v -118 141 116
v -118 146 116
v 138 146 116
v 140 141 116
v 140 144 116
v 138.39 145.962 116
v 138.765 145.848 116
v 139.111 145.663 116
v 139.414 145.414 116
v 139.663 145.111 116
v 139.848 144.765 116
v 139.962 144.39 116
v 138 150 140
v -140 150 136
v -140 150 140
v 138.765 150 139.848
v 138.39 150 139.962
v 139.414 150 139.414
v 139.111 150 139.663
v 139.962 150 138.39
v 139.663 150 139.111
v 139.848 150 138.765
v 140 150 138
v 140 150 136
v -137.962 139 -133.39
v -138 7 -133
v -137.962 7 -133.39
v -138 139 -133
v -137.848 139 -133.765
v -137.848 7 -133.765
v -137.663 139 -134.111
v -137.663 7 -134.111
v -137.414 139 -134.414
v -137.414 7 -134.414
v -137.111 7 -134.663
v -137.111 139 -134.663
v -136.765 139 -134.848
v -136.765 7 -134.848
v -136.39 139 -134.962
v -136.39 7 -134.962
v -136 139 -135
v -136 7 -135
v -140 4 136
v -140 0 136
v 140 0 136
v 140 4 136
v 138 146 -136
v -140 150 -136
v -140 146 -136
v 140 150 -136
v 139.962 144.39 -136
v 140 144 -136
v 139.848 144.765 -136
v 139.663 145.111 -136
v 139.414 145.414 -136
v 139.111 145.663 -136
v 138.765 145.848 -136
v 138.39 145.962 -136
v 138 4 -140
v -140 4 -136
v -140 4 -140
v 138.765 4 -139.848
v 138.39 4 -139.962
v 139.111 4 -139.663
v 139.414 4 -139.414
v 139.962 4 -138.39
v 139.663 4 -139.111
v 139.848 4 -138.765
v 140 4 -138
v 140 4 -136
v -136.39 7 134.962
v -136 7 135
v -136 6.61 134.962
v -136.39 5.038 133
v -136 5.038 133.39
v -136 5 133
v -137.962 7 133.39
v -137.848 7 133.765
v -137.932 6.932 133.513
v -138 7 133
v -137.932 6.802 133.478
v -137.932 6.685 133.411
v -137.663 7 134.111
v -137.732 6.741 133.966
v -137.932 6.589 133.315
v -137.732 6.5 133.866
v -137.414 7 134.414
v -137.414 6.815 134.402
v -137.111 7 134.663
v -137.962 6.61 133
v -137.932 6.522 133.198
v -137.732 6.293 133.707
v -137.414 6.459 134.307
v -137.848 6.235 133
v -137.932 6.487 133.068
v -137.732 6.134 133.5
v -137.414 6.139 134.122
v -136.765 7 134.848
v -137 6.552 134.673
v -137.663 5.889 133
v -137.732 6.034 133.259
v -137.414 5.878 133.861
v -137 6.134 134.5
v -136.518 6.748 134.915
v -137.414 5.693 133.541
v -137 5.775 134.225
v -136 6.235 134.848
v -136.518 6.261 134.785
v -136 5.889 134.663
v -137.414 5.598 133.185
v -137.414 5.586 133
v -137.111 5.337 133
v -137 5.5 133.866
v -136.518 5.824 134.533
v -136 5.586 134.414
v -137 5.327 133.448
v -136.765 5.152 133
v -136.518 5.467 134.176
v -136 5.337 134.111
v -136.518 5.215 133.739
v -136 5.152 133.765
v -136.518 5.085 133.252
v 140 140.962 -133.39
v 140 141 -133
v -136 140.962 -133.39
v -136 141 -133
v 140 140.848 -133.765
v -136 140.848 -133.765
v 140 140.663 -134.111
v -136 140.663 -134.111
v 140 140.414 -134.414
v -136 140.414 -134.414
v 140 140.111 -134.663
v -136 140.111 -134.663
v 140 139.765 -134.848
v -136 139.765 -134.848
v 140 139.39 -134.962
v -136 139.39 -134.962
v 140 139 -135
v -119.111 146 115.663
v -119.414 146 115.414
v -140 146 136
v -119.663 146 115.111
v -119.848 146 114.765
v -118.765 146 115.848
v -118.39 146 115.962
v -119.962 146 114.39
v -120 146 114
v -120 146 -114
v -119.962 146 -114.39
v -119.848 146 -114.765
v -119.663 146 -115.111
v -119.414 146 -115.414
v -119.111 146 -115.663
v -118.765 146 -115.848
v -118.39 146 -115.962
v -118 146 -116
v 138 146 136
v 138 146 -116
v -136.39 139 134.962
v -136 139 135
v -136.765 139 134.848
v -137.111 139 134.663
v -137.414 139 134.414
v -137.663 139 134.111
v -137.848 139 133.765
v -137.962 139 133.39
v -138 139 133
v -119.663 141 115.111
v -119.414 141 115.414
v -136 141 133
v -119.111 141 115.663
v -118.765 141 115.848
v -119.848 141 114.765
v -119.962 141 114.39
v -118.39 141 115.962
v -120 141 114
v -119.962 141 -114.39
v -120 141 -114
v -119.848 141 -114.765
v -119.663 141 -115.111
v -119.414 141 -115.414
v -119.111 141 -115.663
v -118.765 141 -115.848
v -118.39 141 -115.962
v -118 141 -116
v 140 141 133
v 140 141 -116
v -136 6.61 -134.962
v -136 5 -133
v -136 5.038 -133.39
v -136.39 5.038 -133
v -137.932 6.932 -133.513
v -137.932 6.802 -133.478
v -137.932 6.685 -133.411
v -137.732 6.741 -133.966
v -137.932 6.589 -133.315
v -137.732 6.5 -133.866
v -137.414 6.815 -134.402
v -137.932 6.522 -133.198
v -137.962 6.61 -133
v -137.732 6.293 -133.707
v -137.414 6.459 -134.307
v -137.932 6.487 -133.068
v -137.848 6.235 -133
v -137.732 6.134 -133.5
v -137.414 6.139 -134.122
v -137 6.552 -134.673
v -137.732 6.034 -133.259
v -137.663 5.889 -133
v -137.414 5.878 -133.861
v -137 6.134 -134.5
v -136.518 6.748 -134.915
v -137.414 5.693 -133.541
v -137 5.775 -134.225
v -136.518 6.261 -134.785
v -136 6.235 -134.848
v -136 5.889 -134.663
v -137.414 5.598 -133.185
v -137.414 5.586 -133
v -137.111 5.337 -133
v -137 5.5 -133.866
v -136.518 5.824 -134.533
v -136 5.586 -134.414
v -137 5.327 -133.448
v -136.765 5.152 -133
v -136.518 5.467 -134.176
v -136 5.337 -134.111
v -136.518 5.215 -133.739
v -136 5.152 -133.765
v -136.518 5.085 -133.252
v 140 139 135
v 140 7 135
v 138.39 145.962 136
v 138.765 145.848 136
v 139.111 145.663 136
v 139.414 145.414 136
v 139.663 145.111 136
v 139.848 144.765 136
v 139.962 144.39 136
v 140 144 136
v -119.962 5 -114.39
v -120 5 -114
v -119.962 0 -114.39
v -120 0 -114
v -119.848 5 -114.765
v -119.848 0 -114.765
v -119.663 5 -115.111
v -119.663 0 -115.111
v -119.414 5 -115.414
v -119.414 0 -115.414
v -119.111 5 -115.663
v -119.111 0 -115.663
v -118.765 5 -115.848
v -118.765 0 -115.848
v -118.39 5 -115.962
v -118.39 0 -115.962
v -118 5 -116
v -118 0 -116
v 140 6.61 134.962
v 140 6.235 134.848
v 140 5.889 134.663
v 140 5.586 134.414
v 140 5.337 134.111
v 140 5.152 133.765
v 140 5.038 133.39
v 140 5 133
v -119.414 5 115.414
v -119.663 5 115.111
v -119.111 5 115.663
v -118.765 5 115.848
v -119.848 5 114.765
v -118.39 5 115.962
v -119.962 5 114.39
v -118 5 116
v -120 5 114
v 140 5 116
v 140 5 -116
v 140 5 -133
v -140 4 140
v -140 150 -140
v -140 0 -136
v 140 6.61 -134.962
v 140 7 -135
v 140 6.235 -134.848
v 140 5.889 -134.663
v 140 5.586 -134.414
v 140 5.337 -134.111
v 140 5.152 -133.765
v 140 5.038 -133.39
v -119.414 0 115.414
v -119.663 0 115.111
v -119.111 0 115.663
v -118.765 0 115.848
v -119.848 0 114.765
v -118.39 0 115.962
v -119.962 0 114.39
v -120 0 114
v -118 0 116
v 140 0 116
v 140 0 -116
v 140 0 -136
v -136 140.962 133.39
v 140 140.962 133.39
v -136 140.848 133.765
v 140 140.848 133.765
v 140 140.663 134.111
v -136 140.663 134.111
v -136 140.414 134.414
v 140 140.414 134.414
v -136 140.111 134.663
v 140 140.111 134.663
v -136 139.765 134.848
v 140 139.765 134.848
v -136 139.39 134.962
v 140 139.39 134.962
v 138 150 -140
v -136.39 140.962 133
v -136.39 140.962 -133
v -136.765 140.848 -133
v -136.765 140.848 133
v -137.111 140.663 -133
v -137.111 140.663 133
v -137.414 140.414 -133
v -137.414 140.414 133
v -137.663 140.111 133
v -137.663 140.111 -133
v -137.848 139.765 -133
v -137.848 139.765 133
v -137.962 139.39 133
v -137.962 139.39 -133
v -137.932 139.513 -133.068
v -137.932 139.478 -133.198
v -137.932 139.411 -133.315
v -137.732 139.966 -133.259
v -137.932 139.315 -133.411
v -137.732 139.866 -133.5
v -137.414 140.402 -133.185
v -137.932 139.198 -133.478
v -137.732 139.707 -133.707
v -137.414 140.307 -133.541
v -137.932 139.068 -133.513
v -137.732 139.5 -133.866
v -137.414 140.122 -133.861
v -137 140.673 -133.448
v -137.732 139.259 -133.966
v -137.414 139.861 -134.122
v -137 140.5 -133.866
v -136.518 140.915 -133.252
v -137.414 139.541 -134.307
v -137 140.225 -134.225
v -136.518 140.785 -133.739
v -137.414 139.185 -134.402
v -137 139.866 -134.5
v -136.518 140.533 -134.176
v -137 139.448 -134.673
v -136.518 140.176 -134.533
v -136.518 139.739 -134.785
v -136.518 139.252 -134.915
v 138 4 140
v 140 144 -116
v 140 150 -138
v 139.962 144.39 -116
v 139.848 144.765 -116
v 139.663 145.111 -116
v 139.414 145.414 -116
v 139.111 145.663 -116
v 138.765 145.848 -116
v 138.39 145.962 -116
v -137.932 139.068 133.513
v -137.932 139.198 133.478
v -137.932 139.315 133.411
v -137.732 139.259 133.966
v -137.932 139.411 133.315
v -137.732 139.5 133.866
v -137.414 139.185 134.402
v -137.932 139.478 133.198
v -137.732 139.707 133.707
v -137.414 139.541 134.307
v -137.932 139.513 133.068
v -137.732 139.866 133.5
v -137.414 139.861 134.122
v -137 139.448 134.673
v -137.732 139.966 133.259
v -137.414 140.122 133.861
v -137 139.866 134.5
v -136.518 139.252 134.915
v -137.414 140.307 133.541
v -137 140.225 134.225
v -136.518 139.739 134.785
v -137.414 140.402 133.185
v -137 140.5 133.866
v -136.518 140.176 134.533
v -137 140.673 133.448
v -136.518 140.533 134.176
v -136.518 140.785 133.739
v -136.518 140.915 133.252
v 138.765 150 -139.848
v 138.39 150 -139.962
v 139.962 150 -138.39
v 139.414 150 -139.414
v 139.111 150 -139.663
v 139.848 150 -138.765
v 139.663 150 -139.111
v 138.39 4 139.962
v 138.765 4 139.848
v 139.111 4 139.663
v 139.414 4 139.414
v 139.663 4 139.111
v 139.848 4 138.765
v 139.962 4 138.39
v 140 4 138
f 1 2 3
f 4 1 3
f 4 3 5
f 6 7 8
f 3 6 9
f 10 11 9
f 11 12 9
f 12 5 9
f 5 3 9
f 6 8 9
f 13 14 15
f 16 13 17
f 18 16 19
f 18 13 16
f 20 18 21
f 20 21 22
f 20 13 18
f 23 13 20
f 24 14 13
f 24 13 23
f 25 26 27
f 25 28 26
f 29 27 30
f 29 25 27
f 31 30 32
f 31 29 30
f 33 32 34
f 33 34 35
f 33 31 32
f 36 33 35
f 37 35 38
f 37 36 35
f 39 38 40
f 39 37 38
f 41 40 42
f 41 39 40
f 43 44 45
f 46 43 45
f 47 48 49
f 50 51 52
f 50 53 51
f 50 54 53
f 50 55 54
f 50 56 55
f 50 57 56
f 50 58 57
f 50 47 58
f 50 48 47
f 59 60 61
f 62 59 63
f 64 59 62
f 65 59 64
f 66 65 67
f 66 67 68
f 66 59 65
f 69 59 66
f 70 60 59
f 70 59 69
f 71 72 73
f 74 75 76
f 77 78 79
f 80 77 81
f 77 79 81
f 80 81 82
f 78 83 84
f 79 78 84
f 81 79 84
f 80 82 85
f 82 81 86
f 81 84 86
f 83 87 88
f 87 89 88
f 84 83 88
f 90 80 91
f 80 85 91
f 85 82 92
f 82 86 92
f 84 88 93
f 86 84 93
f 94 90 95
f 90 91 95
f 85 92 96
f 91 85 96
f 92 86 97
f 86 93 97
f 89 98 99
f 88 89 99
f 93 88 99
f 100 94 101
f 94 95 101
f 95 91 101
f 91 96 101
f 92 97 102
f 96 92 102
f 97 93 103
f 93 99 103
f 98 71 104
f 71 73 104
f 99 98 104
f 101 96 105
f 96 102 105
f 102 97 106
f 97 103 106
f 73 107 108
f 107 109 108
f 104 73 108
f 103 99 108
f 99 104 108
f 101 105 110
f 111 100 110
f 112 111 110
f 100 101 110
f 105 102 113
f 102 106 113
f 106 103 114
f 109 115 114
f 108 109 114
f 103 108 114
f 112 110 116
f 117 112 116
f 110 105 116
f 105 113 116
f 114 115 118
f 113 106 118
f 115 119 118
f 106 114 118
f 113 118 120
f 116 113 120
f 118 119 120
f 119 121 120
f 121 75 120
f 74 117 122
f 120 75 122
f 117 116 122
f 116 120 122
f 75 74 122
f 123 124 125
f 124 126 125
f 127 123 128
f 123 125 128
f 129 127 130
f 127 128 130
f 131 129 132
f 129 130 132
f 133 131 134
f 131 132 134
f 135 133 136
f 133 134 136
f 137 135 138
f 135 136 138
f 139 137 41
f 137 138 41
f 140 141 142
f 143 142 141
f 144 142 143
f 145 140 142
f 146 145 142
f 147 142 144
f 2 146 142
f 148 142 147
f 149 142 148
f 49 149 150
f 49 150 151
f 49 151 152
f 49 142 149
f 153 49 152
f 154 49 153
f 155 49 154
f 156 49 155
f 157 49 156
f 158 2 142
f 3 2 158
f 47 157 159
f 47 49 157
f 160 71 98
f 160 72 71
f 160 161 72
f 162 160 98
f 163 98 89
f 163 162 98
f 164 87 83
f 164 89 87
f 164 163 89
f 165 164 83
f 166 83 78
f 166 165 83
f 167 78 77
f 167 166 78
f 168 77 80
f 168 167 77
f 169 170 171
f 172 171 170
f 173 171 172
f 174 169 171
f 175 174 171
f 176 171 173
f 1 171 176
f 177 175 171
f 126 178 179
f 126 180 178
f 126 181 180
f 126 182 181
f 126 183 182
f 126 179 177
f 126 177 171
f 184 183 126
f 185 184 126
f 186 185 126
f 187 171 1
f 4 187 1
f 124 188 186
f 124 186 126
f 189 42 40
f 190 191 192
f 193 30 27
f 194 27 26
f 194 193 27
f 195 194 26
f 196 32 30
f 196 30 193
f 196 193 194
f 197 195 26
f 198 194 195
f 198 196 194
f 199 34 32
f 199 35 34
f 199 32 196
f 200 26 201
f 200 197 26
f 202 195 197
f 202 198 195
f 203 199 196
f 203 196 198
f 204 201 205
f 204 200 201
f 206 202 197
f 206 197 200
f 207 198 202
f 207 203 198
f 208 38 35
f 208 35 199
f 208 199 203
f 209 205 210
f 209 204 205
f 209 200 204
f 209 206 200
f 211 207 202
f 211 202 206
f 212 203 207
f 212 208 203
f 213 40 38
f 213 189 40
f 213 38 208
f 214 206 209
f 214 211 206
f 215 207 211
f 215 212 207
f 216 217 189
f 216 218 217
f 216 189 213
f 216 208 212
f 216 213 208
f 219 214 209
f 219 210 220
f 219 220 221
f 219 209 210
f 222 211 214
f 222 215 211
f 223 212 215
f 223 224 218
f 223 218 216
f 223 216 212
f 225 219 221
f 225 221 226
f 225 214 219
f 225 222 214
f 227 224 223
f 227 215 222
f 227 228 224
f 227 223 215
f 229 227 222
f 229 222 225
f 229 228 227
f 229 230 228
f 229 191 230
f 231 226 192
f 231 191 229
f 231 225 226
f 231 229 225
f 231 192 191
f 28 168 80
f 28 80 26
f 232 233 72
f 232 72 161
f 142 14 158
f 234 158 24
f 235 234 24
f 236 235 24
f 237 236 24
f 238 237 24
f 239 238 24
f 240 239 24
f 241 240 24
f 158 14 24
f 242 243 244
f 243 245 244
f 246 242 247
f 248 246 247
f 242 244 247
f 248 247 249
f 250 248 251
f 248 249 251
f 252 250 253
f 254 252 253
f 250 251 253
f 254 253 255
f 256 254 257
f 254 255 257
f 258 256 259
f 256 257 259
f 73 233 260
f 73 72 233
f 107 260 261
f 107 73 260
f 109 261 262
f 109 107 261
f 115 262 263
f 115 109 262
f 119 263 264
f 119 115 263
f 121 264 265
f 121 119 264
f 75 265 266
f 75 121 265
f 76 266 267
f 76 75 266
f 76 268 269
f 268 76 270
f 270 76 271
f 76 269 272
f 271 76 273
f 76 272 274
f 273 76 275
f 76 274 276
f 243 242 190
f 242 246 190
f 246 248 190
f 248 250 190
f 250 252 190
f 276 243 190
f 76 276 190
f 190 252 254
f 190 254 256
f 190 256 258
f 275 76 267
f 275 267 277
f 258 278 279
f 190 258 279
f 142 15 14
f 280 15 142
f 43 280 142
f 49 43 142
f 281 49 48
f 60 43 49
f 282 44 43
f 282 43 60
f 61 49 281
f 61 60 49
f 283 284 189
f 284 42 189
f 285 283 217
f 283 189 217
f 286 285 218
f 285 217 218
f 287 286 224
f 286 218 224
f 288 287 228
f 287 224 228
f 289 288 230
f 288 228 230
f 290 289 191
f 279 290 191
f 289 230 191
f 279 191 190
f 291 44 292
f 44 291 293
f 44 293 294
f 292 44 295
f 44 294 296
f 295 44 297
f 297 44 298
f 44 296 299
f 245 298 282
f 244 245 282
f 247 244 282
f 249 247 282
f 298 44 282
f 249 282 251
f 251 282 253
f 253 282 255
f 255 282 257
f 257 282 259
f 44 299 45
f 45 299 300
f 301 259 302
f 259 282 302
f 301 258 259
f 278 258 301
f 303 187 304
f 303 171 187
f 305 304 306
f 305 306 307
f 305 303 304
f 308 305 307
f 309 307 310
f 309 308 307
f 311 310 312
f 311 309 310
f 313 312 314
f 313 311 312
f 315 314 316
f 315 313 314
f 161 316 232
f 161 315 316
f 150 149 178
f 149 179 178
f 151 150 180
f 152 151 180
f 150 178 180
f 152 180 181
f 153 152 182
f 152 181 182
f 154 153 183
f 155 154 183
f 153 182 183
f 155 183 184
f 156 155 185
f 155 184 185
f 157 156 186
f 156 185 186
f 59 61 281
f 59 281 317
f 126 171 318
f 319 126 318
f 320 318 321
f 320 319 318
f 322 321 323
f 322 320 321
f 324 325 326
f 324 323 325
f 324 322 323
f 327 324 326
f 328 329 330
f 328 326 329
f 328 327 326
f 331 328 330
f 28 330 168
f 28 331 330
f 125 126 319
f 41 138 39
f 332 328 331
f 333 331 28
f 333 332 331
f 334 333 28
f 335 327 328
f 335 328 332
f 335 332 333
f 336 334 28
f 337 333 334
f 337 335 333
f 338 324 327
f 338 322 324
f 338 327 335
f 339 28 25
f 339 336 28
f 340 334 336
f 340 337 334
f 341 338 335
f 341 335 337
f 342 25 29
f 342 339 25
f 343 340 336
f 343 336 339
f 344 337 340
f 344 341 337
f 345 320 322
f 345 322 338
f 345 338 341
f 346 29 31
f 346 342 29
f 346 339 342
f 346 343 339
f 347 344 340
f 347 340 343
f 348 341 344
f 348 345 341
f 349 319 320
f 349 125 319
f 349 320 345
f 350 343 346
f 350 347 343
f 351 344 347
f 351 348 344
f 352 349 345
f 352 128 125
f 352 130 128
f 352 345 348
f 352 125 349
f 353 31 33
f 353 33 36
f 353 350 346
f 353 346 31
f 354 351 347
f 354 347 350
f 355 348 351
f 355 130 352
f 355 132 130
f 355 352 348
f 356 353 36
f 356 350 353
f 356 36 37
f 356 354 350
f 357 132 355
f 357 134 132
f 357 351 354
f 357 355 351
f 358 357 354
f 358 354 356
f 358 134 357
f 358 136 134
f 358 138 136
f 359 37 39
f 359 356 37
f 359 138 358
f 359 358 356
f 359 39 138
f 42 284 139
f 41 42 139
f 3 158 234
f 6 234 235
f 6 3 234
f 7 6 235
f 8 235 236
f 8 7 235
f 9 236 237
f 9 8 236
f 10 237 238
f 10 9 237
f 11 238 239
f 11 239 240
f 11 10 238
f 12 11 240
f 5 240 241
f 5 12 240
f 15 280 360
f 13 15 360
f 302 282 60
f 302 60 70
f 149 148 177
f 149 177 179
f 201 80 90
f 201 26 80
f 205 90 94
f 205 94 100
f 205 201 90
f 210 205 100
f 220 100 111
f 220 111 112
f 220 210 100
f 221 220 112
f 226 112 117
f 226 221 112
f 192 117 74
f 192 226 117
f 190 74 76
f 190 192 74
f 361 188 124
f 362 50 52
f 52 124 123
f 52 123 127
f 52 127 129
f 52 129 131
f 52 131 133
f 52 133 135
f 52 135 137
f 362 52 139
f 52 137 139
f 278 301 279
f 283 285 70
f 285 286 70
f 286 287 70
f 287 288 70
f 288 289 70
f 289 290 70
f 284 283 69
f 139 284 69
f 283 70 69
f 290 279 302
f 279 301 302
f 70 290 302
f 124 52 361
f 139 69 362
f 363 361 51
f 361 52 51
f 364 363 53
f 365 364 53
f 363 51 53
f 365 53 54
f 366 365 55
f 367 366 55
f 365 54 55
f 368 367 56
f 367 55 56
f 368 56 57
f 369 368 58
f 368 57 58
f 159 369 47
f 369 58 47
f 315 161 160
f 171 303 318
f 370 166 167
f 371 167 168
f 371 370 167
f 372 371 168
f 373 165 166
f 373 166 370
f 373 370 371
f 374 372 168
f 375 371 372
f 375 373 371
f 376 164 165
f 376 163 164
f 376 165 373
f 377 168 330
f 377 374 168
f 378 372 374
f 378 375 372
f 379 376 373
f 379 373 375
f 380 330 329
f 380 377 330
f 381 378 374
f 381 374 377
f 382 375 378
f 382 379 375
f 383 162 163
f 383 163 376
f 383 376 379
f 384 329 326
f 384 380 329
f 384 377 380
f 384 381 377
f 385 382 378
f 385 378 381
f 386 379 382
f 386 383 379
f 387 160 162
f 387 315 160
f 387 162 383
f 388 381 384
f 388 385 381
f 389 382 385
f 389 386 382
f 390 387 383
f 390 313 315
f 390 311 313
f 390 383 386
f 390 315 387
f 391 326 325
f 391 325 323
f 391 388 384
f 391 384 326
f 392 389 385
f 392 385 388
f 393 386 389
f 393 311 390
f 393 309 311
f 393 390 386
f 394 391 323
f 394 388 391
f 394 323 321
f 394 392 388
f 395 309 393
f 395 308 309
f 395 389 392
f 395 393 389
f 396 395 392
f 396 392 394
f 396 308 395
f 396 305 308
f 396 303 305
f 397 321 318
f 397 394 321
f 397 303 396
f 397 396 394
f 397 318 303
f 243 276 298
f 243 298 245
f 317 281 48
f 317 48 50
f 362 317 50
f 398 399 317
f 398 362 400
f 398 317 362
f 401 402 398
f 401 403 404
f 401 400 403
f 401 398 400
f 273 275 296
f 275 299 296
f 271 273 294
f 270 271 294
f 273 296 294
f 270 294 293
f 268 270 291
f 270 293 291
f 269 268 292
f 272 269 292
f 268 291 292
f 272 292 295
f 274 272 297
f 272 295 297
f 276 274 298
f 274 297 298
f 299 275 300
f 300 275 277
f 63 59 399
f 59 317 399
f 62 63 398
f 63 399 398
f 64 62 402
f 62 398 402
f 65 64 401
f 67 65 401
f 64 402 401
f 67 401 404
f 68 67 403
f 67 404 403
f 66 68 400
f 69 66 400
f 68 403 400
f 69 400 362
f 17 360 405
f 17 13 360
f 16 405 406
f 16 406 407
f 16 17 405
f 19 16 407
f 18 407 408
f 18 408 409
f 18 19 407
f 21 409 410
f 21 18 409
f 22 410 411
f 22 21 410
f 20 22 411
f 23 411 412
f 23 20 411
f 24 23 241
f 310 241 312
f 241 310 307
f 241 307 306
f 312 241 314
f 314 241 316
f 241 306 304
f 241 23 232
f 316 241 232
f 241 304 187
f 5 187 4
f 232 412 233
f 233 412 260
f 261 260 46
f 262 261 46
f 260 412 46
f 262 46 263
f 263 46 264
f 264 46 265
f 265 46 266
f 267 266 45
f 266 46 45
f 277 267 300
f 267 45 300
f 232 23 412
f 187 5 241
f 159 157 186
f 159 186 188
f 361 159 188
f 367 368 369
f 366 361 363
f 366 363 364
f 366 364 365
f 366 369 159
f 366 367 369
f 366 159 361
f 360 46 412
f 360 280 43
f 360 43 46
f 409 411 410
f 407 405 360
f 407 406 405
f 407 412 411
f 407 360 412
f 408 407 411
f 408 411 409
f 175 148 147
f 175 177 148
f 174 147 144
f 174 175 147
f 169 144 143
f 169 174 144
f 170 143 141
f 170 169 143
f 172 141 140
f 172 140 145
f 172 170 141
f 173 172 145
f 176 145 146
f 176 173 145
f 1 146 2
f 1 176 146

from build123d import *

# Parameters (mm, degrees)
SKETCH_1_W          = 280
SKETCH_1_H          = 280
EXTRUDE_1_DEPTH     = 150
SKETCH_2_W          = 280
SKETCH_2_H          = 272
CUT_EXTRUDE_1_DEPTH = 4
SKETCH_3_W          = 280
SKETCH_3_H          = 4
CUT_EXTRUDE_2_DEPTH = 4
SKETCH_4_W          = 270
SKETCH_4_H          = 136
CUT_EXTRUDE_3_DEPTH = 278
SKETCH_6_W          = 260
SKETCH_6_H          = 232
CUT_EXTRUDE_7_DEPTH = 247
FILLET_4_R          = 2
FILLET_5_R          = 2
FILLET_6_R          = 2
FILLET_7_R          = 2


with BuildPart() as part:
    # 草图1 → 凸台-拉伸1 (new body)
    with BuildSketch(Plane(origin=(0, 0, 0), x_dir=(1, 0, 0), z_dir=(0, 1, 0))):
        Rectangle(SKETCH_1_W, SKETCH_1_H)
    extrude(amount=EXTRUDE_1_DEPTH)

    # 草图2 → 切除-拉伸1 (cut)
    with BuildSketch(Plane(origin=(0, 150, 0), x_dir=(1, 0, 0), z_dir=(0, 1, 0))):
        Rectangle(SKETCH_2_W, SKETCH_2_H)
    extrude(amount=-CUT_EXTRUDE_1_DEPTH, mode=Mode.SUBTRACT)

    # 草图3 → 切除-拉伸2 (cut)
    with BuildSketch(Plane.XZ):
        with Locations((0, 138)):
            Rectangle(SKETCH_3_W, SKETCH_3_H)
        with Locations((0, -138)):
            Rectangle(SKETCH_3_W, SKETCH_3_H)
    extrude(amount=-CUT_EXTRUDE_2_DEPTH, mode=Mode.SUBTRACT)

    # 草图4 → 切除-拉伸3 (cut)
    with BuildSketch(Plane(origin=(140, 0, 0), x_dir=(0, 0, -1), z_dir=(1, 0, 0))):
        with Locations((0, 73)):
            Rectangle(SKETCH_4_W, SKETCH_4_H)
    extrude(amount=-CUT_EXTRUDE_3_DEPTH, mode=Mode.SUBTRACT)

    # 草图6 → 切除-拉伸7 (cut, through all)
    with BuildSketch(Plane(origin=(0, 146, 0), x_dir=(1, 0, 0), z_dir=(0, 1, 0))):
        with Locations((10, 0)):
            Rectangle(SKETCH_6_W, SKETCH_6_H)
    extrude(amount=-CUT_EXTRUDE_7_DEPTH, mode=Mode.SUBTRACT)

    # 圆角4
    fillet_4_edges = [part.edges().sort_by_distance(p)[0] for p in [
        (140, 77, -140),
        (140, 77, 140),
    ]]
    fillet(fillet_4_edges, radius=FILLET_4_R)

    # 圆角5
    fillet_5_edges = [part.edges().sort_by_distance(p)[0] for p in [
        (140, 146, 126),
        (140, 146, -126),
    ]]
    fillet(fillet_5_edges, radius=FILLET_5_R)

    # 圆角6
    fillet_6_edges = [part.edges().sort_by_distance(p)[0] for p in [
        (-120, 143.5, 116),
        (-120, 2.5, 116),
        (-120, 143.5, -116),
        (-120, 2.5, -116),
    ]]
    fillet(fillet_6_edges, radius=FILLET_6_R)

    # 圆角7
    fillet_7_edges = [part.edges().sort_by_distance(p)[0] for p in [
        (1, 5, 135),
        (1, 141, 135),
        (1, 141, -135),
        (1, 5, -135),
        (-138, 73, 135),
        (-138, 141, 0),
        (-138, 73, -135),
        (-138, 5, 0),
    ]]
    fillet(fillet_7_edges, radius=FILLET_7_R)


solid = part.part
